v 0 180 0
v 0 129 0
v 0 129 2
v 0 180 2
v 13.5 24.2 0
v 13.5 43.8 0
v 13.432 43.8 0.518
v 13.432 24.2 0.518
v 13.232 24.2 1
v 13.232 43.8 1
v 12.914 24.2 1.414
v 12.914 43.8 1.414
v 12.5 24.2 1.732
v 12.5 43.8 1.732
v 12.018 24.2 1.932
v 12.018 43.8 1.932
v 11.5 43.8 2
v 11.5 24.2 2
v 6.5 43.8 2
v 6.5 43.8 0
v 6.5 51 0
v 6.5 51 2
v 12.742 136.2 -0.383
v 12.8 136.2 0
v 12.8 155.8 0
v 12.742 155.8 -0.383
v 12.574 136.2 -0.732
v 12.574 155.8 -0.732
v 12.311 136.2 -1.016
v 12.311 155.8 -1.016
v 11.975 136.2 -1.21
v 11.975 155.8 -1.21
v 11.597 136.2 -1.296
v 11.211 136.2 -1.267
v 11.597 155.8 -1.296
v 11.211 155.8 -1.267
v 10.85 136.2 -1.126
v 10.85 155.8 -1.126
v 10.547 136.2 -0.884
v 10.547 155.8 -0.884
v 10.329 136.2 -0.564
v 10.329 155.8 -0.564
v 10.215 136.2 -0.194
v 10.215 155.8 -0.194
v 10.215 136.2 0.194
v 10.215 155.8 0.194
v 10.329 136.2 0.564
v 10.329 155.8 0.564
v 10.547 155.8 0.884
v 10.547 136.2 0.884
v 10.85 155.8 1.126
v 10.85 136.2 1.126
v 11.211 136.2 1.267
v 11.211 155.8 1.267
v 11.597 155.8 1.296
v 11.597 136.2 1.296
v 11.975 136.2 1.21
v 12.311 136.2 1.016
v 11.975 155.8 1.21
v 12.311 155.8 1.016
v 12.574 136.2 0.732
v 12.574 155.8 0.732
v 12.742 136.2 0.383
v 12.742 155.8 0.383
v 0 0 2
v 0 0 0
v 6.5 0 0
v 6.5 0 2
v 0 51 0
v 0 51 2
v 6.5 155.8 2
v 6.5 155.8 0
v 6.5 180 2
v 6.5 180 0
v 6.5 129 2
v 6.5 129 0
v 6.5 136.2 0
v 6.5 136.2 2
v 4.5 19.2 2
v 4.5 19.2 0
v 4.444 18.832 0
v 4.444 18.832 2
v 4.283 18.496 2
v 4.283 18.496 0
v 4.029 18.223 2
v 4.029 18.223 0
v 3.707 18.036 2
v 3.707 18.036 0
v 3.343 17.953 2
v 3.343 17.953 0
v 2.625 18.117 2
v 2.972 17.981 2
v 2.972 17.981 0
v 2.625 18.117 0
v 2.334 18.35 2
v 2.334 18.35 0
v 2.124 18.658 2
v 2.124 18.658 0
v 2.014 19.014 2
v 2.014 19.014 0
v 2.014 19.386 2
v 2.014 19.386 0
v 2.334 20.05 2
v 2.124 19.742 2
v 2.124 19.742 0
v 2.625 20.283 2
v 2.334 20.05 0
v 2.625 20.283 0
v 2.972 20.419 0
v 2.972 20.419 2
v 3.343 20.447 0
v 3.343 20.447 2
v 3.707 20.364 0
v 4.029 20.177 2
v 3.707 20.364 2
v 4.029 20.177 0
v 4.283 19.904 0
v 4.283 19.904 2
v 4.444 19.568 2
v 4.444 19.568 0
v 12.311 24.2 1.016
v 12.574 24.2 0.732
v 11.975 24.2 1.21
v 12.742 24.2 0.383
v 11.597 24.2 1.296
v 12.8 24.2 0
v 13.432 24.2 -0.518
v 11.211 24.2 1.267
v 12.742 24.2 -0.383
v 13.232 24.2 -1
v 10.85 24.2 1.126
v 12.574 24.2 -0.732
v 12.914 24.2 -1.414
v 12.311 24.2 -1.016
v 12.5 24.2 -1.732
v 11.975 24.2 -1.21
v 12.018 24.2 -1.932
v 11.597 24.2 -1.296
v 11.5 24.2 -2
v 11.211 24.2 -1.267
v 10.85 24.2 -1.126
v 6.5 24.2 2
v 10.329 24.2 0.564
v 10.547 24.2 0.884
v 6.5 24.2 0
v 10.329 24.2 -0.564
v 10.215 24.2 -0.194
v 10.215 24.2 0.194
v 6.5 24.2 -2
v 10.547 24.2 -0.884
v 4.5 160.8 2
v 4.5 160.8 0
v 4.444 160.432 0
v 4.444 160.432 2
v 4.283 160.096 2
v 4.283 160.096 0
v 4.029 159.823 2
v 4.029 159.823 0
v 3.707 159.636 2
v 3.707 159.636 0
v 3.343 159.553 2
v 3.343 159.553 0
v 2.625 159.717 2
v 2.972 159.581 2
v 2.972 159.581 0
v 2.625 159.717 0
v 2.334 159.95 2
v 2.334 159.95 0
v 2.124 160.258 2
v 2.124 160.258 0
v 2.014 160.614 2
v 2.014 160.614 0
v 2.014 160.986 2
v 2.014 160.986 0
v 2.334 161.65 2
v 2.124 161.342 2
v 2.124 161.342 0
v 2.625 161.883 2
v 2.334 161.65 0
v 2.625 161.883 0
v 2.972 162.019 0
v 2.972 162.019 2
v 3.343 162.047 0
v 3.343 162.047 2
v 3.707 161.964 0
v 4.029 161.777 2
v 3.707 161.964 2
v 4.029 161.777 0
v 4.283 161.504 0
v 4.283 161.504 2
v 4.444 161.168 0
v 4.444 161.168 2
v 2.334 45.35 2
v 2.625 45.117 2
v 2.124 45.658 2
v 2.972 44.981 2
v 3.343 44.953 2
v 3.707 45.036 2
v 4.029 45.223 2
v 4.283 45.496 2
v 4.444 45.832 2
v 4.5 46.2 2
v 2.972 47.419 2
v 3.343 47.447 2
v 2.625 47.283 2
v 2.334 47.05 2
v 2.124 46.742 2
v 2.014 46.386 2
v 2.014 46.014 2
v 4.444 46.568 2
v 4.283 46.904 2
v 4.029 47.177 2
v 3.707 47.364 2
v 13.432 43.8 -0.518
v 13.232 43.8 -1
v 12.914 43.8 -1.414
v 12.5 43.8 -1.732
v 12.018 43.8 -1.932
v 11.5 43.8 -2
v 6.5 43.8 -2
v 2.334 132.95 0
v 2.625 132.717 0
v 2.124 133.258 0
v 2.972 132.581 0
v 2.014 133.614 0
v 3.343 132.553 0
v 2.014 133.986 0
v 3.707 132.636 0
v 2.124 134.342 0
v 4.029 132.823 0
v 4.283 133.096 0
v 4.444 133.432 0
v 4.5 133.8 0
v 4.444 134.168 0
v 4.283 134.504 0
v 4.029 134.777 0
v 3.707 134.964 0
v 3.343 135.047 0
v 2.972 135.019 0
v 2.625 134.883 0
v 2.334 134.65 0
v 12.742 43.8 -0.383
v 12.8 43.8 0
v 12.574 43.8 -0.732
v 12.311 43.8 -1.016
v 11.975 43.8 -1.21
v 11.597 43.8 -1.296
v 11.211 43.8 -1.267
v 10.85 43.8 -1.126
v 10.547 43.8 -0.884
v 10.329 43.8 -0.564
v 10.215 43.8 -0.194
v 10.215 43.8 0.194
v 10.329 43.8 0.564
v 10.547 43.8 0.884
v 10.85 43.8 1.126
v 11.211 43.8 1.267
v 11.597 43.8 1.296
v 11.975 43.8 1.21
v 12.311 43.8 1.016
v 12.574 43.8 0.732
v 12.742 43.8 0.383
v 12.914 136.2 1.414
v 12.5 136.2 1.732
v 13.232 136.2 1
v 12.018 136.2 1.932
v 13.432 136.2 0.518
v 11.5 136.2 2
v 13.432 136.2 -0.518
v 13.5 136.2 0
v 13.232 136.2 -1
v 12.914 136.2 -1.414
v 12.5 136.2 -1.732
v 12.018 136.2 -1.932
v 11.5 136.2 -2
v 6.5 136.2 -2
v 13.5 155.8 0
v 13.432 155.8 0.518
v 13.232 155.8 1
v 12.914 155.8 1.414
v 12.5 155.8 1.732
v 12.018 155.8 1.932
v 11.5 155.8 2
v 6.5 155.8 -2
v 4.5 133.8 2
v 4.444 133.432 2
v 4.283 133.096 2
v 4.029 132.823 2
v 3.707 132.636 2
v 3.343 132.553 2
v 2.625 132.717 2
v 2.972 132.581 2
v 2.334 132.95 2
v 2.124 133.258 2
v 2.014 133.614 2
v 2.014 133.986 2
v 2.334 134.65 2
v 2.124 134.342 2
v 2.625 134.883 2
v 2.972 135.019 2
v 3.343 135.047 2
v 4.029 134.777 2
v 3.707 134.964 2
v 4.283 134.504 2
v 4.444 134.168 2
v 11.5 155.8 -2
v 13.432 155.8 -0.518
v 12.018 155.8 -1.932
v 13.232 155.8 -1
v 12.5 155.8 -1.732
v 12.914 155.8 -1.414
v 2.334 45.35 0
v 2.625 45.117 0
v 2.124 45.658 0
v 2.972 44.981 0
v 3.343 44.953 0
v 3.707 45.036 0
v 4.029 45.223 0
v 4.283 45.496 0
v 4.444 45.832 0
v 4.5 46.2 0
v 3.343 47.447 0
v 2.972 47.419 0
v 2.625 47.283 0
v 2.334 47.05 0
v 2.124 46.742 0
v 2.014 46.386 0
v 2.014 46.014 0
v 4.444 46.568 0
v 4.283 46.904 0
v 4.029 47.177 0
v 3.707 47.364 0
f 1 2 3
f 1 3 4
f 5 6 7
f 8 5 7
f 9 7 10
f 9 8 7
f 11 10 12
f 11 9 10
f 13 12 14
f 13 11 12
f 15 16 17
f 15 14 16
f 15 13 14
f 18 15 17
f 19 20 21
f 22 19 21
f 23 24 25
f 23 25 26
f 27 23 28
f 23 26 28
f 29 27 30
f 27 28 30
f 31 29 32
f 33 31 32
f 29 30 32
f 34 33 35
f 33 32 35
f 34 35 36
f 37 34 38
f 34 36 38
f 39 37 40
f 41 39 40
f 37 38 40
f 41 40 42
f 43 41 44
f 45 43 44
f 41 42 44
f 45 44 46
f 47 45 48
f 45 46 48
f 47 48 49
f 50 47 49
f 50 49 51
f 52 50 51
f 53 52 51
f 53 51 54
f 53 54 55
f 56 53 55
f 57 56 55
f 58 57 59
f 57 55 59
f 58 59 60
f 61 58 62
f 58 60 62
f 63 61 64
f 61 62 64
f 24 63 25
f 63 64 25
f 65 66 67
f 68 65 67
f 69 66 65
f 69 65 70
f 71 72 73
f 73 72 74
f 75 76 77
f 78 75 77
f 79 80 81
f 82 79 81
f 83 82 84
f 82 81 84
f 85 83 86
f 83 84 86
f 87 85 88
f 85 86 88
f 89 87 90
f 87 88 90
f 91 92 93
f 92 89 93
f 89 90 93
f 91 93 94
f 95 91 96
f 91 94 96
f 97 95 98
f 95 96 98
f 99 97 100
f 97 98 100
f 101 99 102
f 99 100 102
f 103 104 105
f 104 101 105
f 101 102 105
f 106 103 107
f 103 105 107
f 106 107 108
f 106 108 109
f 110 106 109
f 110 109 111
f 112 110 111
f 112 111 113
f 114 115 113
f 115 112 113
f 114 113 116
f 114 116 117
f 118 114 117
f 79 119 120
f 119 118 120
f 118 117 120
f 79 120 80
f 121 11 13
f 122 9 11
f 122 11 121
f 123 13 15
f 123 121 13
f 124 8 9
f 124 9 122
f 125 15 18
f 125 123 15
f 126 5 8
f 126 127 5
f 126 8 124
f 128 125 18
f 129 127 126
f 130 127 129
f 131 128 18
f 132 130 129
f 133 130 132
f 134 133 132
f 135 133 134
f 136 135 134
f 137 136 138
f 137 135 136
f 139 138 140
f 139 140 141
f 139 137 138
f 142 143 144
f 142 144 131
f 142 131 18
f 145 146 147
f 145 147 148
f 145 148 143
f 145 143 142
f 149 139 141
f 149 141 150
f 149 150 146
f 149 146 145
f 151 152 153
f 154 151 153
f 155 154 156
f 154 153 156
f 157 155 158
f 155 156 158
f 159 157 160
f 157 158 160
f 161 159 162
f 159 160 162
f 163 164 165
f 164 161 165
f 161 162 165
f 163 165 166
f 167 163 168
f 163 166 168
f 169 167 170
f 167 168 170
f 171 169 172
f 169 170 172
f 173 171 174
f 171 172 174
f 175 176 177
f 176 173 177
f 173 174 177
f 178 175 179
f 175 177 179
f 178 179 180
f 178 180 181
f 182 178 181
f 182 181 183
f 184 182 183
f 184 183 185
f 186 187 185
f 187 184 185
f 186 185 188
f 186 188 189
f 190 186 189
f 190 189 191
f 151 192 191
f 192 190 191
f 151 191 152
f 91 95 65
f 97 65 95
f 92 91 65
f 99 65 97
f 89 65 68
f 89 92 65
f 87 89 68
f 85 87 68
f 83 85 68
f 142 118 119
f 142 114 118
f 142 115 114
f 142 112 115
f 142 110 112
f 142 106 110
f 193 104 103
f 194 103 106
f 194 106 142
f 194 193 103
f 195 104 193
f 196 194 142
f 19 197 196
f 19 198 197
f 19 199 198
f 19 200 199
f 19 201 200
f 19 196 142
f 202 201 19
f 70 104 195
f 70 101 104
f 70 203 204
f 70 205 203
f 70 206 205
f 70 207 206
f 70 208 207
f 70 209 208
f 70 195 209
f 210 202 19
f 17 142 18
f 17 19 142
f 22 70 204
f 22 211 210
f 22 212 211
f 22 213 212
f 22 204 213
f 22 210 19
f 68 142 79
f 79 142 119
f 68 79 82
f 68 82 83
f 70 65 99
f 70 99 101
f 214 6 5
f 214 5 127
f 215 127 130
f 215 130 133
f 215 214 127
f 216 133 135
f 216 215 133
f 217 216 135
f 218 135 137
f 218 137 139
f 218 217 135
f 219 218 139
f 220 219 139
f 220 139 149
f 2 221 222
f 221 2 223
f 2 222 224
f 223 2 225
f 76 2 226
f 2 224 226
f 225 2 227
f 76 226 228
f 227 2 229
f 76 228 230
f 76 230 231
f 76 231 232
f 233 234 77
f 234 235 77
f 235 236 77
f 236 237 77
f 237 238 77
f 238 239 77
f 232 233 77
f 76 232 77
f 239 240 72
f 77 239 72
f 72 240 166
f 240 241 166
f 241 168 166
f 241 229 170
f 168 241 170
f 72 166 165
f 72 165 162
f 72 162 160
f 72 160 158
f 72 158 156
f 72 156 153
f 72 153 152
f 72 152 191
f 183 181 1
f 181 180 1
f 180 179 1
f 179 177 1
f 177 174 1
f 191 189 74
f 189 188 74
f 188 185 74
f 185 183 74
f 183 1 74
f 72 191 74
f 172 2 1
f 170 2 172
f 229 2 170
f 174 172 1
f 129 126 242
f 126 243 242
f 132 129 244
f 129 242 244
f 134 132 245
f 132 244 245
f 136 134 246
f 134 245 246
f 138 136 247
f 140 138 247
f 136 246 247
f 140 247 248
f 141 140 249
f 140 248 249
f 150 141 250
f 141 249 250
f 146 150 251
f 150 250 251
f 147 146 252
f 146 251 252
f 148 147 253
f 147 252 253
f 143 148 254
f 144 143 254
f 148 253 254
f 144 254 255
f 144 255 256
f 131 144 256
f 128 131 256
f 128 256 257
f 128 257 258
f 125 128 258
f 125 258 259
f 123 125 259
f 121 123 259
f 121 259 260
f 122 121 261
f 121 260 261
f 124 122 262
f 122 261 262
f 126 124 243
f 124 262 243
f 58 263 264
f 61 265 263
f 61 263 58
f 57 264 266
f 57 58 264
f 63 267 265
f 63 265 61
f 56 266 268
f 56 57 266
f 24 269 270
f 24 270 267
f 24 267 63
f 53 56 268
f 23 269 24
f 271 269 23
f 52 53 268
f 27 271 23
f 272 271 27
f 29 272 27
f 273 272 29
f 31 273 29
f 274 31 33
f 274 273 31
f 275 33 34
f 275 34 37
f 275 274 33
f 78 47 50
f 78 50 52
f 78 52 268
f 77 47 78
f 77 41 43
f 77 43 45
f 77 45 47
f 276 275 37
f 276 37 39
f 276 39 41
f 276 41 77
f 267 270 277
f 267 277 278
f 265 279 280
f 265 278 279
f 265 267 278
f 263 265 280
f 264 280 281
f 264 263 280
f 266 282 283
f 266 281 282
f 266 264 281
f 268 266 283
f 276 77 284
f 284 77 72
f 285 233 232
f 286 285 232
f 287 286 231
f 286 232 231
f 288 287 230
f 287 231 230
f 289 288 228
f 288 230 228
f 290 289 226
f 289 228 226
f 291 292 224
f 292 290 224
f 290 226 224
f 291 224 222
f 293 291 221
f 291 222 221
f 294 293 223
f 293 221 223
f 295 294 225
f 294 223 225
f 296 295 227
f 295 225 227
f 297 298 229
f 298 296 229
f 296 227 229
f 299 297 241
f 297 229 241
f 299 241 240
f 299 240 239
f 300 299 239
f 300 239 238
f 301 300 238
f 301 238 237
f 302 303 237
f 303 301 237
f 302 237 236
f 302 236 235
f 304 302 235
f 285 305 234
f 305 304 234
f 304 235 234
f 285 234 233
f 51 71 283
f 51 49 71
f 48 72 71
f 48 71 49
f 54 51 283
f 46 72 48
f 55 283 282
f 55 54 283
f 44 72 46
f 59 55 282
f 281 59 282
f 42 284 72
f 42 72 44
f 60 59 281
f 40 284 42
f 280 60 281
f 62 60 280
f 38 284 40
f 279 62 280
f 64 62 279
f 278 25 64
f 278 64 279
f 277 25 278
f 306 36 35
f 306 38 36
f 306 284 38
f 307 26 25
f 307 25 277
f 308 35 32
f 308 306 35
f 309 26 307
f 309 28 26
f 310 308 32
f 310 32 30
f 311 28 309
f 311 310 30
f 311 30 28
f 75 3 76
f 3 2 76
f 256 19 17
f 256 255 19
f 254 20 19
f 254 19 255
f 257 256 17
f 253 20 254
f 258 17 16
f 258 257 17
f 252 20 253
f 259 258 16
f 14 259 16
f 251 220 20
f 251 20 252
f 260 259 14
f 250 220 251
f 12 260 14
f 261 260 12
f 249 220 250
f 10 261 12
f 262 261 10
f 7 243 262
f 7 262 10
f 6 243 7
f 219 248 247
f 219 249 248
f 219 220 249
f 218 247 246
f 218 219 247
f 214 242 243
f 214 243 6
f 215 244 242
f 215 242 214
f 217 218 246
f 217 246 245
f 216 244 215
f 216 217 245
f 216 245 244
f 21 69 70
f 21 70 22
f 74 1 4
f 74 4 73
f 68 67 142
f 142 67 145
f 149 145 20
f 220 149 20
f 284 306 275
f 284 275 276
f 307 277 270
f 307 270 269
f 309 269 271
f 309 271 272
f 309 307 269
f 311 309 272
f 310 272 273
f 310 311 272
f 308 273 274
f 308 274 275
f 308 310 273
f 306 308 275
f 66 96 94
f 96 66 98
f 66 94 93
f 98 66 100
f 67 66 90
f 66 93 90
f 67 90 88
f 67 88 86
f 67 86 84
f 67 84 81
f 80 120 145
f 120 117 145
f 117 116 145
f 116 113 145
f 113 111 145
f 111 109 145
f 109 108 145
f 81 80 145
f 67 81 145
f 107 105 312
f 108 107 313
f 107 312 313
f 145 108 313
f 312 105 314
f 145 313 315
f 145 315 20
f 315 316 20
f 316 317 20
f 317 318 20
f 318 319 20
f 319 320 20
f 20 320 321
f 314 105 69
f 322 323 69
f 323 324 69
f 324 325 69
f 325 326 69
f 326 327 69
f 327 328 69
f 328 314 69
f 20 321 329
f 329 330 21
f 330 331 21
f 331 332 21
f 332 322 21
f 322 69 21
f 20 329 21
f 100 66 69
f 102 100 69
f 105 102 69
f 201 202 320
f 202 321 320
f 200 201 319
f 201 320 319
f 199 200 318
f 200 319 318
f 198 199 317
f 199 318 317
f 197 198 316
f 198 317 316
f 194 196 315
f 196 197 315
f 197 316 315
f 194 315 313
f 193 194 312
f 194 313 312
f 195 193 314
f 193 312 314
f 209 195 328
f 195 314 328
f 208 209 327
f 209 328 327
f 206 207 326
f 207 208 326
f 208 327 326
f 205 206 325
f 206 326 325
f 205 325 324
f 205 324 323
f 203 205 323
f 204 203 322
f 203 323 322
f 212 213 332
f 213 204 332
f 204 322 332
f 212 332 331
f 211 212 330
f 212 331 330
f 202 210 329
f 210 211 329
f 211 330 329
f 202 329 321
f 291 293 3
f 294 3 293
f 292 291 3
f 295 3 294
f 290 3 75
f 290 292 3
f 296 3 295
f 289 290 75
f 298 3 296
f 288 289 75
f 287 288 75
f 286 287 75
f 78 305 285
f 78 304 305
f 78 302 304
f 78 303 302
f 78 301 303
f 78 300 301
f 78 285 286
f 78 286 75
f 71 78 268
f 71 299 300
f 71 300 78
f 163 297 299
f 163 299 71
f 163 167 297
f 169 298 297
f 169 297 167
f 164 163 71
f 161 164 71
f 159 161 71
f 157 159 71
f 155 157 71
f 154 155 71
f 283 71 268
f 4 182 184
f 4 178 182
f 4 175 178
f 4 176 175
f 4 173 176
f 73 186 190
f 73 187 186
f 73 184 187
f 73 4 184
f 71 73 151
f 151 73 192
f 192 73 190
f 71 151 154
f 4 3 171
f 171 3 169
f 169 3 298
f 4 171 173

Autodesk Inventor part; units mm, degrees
ref_plane "YZ Plane" through (0, 0, 0) normal (1, 0, 0) x (0, 1, 0)
ref_plane "XZ Plane" through (0, 0, 0) normal (0, 1, 0) x (-1, 0, 0)
ref_plane "XY Plane" through (0, 0, 0) normal (0, 0, 1) x (1, 0, 0)
sketch "Sketch1" plane through (0, 0, 0) normal (0, 0, 1) x (1, 0, 0)
  circle A0 centre (3.25, 19.2) radius 1.25 projected
  circle A1 centre (3.25, 46.2) radius 1.25 projected
  circle A2 centre (3.25, 133.8) radius 1.25 projected
  circle A3 centre (3.25, 160.8) radius 1.25 projected
  line L0 (0, 0) -> (6.5, 0) projected
  line L1 (6.5, 0) -> (6.5, 180) projected
  line L2 (0, 180) -> (6.5, 180) projected
  line L3 (0, 0) -> (0, 180) projected
  line L4 (6.5, 180) -> (0, 180)
  line L5 (0, 180) -> (0, 129)
  line L6 (0, 129) -> (6.5, 129)
  line L7 (6.5, 129) -> (6.5, 180)
  line L8 (6.5, 0) -> (0, 0)
  line L9 (0, 0) -> (0, 51)
  line L10 (0, 51) -> (6.5, 51)
  line L11 (6.5, 51) -> (6.5, 0)
  line L12 (6.5, 155.8) -> (13.5, 155.8)
  line L13 (13.5, 155.8) -> (13.5, 136.2)
  line L14 (13.5, 136.2) -> (6.5, 136.2)
  line L15 (6.5, 136.2) -> (6.5, 155.8)
  line L16 (6.5, 43.8) -> (13.5, 43.8)
  line L17 (13.5, 43.8) -> (13.5, 24.2)
  line L18 (13.5, 24.2) -> (6.5, 24.2)
  line L19 (6.5, 24.2) -> (6.5, 43.8)
  dimension "d0" = 51
  dimension "d1" = 51
  dimension "d2" = 7
  dimension "d3" = 19.6
  dimension "d4" = 24.2
  dimension "d5" = 7
  dimension "d6" = 19.6
  dimension "d7" = 24.2
extrude "Extrusion1" add sketch "Sketch1" along normal blind 2 contours L3 L10 L1 L0 | L1 L16 L17 L18 | L3 L2 L1 L6 | L1 L12 L13 L14
sketch "Sketch2" plane through (0, 0, 0) normal (0, 0, -1) x (-1, 0, 0)
  line L0 (0, 51) -> (0, 0) projected
  line L1 (-6.5, 51) -> (0, 51) projected
  line L2 (-6.5, 43.8) -> (-6.5, 51) projected
  line L3 (-13.5, 43.8) -> (-6.5, 43.8) projected
  line L4 (-13.5, 24.2) -> (-13.5, 43.8) projected
  line L5 (-6.5, 24.2) -> (-13.5, 24.2) projected
  line L6 (-6.5, 0) -> (-6.5, 24.2) projected
  line L7 (0, 0) -> (-6.5, 0) projected
  circle A0 centre (-3.25, 19.2) radius 1.25 projected
  circle A1 centre (-3.25, 46.2) radius 1.25 projected
  line L8 (-6.5, 129) -> (-6.5, 136.2) projected
  line L9 (0, 129) -> (-6.5, 129) projected
  line L10 (0, 180) -> (0, 129) projected
  line L11 (-6.5, 180) -> (0, 180) projected
  line L12 (-6.5, 155.8) -> (-6.5, 180) projected
  line L13 (-13.5, 155.8) -> (-6.5, 155.8) projected
  line L14 (-13.5, 136.2) -> (-13.5, 155.8) projected
  line L15 (-6.5, 136.2) -> (-13.5, 136.2) projected
  circle A2 centre (-3.25, 133.8) radius 1.25 projected
  circle A3 centre (-3.25, 160.8) radius 1.25 projected
  line L16 (-6.5, 136.2) -> (-6.5, 155.8)
  line L17 (-6.5, 24.2) -> (-6.5, 43.8)
extrude "Extrusion2" add sketch "Sketch2" along normal blind 2 contours L17 L5 L4 L3 | L15 L14 L13 L16
fillet "Fillet1" radius 2 4 edges at (13.5, 34, -2) (13.5, 34, 2) (13.5, 146, -2) (13.5, 146, 2)
sketch "Sketch3" plane through (6.5, 155.8, 0) normal (0, 1, 0) x (1, 0, 0)
  circle A0 centre (5, 0) radius 1.3
  arc A1 (5, -2) -> (5, 2) centre (5, 0) ccw projected
  point P0 (-6.5, 0)
  dimension "d13" = 2.6
extrude "Extrusion3" cut sketch "Sketch3" against normal blind 20
sketch "Sketch4" plane through (6.5, 43.8, 0) normal (0, 1, 0) x (1, 0, 0)
  circle A0 centre (5, 0) radius 1.3 projected
  point P0 (-6.5, 0)
extrude "Extrusion4" cut sketch "Sketch4" against normal blind 20
properties part number "mocowaniedoplugu"
